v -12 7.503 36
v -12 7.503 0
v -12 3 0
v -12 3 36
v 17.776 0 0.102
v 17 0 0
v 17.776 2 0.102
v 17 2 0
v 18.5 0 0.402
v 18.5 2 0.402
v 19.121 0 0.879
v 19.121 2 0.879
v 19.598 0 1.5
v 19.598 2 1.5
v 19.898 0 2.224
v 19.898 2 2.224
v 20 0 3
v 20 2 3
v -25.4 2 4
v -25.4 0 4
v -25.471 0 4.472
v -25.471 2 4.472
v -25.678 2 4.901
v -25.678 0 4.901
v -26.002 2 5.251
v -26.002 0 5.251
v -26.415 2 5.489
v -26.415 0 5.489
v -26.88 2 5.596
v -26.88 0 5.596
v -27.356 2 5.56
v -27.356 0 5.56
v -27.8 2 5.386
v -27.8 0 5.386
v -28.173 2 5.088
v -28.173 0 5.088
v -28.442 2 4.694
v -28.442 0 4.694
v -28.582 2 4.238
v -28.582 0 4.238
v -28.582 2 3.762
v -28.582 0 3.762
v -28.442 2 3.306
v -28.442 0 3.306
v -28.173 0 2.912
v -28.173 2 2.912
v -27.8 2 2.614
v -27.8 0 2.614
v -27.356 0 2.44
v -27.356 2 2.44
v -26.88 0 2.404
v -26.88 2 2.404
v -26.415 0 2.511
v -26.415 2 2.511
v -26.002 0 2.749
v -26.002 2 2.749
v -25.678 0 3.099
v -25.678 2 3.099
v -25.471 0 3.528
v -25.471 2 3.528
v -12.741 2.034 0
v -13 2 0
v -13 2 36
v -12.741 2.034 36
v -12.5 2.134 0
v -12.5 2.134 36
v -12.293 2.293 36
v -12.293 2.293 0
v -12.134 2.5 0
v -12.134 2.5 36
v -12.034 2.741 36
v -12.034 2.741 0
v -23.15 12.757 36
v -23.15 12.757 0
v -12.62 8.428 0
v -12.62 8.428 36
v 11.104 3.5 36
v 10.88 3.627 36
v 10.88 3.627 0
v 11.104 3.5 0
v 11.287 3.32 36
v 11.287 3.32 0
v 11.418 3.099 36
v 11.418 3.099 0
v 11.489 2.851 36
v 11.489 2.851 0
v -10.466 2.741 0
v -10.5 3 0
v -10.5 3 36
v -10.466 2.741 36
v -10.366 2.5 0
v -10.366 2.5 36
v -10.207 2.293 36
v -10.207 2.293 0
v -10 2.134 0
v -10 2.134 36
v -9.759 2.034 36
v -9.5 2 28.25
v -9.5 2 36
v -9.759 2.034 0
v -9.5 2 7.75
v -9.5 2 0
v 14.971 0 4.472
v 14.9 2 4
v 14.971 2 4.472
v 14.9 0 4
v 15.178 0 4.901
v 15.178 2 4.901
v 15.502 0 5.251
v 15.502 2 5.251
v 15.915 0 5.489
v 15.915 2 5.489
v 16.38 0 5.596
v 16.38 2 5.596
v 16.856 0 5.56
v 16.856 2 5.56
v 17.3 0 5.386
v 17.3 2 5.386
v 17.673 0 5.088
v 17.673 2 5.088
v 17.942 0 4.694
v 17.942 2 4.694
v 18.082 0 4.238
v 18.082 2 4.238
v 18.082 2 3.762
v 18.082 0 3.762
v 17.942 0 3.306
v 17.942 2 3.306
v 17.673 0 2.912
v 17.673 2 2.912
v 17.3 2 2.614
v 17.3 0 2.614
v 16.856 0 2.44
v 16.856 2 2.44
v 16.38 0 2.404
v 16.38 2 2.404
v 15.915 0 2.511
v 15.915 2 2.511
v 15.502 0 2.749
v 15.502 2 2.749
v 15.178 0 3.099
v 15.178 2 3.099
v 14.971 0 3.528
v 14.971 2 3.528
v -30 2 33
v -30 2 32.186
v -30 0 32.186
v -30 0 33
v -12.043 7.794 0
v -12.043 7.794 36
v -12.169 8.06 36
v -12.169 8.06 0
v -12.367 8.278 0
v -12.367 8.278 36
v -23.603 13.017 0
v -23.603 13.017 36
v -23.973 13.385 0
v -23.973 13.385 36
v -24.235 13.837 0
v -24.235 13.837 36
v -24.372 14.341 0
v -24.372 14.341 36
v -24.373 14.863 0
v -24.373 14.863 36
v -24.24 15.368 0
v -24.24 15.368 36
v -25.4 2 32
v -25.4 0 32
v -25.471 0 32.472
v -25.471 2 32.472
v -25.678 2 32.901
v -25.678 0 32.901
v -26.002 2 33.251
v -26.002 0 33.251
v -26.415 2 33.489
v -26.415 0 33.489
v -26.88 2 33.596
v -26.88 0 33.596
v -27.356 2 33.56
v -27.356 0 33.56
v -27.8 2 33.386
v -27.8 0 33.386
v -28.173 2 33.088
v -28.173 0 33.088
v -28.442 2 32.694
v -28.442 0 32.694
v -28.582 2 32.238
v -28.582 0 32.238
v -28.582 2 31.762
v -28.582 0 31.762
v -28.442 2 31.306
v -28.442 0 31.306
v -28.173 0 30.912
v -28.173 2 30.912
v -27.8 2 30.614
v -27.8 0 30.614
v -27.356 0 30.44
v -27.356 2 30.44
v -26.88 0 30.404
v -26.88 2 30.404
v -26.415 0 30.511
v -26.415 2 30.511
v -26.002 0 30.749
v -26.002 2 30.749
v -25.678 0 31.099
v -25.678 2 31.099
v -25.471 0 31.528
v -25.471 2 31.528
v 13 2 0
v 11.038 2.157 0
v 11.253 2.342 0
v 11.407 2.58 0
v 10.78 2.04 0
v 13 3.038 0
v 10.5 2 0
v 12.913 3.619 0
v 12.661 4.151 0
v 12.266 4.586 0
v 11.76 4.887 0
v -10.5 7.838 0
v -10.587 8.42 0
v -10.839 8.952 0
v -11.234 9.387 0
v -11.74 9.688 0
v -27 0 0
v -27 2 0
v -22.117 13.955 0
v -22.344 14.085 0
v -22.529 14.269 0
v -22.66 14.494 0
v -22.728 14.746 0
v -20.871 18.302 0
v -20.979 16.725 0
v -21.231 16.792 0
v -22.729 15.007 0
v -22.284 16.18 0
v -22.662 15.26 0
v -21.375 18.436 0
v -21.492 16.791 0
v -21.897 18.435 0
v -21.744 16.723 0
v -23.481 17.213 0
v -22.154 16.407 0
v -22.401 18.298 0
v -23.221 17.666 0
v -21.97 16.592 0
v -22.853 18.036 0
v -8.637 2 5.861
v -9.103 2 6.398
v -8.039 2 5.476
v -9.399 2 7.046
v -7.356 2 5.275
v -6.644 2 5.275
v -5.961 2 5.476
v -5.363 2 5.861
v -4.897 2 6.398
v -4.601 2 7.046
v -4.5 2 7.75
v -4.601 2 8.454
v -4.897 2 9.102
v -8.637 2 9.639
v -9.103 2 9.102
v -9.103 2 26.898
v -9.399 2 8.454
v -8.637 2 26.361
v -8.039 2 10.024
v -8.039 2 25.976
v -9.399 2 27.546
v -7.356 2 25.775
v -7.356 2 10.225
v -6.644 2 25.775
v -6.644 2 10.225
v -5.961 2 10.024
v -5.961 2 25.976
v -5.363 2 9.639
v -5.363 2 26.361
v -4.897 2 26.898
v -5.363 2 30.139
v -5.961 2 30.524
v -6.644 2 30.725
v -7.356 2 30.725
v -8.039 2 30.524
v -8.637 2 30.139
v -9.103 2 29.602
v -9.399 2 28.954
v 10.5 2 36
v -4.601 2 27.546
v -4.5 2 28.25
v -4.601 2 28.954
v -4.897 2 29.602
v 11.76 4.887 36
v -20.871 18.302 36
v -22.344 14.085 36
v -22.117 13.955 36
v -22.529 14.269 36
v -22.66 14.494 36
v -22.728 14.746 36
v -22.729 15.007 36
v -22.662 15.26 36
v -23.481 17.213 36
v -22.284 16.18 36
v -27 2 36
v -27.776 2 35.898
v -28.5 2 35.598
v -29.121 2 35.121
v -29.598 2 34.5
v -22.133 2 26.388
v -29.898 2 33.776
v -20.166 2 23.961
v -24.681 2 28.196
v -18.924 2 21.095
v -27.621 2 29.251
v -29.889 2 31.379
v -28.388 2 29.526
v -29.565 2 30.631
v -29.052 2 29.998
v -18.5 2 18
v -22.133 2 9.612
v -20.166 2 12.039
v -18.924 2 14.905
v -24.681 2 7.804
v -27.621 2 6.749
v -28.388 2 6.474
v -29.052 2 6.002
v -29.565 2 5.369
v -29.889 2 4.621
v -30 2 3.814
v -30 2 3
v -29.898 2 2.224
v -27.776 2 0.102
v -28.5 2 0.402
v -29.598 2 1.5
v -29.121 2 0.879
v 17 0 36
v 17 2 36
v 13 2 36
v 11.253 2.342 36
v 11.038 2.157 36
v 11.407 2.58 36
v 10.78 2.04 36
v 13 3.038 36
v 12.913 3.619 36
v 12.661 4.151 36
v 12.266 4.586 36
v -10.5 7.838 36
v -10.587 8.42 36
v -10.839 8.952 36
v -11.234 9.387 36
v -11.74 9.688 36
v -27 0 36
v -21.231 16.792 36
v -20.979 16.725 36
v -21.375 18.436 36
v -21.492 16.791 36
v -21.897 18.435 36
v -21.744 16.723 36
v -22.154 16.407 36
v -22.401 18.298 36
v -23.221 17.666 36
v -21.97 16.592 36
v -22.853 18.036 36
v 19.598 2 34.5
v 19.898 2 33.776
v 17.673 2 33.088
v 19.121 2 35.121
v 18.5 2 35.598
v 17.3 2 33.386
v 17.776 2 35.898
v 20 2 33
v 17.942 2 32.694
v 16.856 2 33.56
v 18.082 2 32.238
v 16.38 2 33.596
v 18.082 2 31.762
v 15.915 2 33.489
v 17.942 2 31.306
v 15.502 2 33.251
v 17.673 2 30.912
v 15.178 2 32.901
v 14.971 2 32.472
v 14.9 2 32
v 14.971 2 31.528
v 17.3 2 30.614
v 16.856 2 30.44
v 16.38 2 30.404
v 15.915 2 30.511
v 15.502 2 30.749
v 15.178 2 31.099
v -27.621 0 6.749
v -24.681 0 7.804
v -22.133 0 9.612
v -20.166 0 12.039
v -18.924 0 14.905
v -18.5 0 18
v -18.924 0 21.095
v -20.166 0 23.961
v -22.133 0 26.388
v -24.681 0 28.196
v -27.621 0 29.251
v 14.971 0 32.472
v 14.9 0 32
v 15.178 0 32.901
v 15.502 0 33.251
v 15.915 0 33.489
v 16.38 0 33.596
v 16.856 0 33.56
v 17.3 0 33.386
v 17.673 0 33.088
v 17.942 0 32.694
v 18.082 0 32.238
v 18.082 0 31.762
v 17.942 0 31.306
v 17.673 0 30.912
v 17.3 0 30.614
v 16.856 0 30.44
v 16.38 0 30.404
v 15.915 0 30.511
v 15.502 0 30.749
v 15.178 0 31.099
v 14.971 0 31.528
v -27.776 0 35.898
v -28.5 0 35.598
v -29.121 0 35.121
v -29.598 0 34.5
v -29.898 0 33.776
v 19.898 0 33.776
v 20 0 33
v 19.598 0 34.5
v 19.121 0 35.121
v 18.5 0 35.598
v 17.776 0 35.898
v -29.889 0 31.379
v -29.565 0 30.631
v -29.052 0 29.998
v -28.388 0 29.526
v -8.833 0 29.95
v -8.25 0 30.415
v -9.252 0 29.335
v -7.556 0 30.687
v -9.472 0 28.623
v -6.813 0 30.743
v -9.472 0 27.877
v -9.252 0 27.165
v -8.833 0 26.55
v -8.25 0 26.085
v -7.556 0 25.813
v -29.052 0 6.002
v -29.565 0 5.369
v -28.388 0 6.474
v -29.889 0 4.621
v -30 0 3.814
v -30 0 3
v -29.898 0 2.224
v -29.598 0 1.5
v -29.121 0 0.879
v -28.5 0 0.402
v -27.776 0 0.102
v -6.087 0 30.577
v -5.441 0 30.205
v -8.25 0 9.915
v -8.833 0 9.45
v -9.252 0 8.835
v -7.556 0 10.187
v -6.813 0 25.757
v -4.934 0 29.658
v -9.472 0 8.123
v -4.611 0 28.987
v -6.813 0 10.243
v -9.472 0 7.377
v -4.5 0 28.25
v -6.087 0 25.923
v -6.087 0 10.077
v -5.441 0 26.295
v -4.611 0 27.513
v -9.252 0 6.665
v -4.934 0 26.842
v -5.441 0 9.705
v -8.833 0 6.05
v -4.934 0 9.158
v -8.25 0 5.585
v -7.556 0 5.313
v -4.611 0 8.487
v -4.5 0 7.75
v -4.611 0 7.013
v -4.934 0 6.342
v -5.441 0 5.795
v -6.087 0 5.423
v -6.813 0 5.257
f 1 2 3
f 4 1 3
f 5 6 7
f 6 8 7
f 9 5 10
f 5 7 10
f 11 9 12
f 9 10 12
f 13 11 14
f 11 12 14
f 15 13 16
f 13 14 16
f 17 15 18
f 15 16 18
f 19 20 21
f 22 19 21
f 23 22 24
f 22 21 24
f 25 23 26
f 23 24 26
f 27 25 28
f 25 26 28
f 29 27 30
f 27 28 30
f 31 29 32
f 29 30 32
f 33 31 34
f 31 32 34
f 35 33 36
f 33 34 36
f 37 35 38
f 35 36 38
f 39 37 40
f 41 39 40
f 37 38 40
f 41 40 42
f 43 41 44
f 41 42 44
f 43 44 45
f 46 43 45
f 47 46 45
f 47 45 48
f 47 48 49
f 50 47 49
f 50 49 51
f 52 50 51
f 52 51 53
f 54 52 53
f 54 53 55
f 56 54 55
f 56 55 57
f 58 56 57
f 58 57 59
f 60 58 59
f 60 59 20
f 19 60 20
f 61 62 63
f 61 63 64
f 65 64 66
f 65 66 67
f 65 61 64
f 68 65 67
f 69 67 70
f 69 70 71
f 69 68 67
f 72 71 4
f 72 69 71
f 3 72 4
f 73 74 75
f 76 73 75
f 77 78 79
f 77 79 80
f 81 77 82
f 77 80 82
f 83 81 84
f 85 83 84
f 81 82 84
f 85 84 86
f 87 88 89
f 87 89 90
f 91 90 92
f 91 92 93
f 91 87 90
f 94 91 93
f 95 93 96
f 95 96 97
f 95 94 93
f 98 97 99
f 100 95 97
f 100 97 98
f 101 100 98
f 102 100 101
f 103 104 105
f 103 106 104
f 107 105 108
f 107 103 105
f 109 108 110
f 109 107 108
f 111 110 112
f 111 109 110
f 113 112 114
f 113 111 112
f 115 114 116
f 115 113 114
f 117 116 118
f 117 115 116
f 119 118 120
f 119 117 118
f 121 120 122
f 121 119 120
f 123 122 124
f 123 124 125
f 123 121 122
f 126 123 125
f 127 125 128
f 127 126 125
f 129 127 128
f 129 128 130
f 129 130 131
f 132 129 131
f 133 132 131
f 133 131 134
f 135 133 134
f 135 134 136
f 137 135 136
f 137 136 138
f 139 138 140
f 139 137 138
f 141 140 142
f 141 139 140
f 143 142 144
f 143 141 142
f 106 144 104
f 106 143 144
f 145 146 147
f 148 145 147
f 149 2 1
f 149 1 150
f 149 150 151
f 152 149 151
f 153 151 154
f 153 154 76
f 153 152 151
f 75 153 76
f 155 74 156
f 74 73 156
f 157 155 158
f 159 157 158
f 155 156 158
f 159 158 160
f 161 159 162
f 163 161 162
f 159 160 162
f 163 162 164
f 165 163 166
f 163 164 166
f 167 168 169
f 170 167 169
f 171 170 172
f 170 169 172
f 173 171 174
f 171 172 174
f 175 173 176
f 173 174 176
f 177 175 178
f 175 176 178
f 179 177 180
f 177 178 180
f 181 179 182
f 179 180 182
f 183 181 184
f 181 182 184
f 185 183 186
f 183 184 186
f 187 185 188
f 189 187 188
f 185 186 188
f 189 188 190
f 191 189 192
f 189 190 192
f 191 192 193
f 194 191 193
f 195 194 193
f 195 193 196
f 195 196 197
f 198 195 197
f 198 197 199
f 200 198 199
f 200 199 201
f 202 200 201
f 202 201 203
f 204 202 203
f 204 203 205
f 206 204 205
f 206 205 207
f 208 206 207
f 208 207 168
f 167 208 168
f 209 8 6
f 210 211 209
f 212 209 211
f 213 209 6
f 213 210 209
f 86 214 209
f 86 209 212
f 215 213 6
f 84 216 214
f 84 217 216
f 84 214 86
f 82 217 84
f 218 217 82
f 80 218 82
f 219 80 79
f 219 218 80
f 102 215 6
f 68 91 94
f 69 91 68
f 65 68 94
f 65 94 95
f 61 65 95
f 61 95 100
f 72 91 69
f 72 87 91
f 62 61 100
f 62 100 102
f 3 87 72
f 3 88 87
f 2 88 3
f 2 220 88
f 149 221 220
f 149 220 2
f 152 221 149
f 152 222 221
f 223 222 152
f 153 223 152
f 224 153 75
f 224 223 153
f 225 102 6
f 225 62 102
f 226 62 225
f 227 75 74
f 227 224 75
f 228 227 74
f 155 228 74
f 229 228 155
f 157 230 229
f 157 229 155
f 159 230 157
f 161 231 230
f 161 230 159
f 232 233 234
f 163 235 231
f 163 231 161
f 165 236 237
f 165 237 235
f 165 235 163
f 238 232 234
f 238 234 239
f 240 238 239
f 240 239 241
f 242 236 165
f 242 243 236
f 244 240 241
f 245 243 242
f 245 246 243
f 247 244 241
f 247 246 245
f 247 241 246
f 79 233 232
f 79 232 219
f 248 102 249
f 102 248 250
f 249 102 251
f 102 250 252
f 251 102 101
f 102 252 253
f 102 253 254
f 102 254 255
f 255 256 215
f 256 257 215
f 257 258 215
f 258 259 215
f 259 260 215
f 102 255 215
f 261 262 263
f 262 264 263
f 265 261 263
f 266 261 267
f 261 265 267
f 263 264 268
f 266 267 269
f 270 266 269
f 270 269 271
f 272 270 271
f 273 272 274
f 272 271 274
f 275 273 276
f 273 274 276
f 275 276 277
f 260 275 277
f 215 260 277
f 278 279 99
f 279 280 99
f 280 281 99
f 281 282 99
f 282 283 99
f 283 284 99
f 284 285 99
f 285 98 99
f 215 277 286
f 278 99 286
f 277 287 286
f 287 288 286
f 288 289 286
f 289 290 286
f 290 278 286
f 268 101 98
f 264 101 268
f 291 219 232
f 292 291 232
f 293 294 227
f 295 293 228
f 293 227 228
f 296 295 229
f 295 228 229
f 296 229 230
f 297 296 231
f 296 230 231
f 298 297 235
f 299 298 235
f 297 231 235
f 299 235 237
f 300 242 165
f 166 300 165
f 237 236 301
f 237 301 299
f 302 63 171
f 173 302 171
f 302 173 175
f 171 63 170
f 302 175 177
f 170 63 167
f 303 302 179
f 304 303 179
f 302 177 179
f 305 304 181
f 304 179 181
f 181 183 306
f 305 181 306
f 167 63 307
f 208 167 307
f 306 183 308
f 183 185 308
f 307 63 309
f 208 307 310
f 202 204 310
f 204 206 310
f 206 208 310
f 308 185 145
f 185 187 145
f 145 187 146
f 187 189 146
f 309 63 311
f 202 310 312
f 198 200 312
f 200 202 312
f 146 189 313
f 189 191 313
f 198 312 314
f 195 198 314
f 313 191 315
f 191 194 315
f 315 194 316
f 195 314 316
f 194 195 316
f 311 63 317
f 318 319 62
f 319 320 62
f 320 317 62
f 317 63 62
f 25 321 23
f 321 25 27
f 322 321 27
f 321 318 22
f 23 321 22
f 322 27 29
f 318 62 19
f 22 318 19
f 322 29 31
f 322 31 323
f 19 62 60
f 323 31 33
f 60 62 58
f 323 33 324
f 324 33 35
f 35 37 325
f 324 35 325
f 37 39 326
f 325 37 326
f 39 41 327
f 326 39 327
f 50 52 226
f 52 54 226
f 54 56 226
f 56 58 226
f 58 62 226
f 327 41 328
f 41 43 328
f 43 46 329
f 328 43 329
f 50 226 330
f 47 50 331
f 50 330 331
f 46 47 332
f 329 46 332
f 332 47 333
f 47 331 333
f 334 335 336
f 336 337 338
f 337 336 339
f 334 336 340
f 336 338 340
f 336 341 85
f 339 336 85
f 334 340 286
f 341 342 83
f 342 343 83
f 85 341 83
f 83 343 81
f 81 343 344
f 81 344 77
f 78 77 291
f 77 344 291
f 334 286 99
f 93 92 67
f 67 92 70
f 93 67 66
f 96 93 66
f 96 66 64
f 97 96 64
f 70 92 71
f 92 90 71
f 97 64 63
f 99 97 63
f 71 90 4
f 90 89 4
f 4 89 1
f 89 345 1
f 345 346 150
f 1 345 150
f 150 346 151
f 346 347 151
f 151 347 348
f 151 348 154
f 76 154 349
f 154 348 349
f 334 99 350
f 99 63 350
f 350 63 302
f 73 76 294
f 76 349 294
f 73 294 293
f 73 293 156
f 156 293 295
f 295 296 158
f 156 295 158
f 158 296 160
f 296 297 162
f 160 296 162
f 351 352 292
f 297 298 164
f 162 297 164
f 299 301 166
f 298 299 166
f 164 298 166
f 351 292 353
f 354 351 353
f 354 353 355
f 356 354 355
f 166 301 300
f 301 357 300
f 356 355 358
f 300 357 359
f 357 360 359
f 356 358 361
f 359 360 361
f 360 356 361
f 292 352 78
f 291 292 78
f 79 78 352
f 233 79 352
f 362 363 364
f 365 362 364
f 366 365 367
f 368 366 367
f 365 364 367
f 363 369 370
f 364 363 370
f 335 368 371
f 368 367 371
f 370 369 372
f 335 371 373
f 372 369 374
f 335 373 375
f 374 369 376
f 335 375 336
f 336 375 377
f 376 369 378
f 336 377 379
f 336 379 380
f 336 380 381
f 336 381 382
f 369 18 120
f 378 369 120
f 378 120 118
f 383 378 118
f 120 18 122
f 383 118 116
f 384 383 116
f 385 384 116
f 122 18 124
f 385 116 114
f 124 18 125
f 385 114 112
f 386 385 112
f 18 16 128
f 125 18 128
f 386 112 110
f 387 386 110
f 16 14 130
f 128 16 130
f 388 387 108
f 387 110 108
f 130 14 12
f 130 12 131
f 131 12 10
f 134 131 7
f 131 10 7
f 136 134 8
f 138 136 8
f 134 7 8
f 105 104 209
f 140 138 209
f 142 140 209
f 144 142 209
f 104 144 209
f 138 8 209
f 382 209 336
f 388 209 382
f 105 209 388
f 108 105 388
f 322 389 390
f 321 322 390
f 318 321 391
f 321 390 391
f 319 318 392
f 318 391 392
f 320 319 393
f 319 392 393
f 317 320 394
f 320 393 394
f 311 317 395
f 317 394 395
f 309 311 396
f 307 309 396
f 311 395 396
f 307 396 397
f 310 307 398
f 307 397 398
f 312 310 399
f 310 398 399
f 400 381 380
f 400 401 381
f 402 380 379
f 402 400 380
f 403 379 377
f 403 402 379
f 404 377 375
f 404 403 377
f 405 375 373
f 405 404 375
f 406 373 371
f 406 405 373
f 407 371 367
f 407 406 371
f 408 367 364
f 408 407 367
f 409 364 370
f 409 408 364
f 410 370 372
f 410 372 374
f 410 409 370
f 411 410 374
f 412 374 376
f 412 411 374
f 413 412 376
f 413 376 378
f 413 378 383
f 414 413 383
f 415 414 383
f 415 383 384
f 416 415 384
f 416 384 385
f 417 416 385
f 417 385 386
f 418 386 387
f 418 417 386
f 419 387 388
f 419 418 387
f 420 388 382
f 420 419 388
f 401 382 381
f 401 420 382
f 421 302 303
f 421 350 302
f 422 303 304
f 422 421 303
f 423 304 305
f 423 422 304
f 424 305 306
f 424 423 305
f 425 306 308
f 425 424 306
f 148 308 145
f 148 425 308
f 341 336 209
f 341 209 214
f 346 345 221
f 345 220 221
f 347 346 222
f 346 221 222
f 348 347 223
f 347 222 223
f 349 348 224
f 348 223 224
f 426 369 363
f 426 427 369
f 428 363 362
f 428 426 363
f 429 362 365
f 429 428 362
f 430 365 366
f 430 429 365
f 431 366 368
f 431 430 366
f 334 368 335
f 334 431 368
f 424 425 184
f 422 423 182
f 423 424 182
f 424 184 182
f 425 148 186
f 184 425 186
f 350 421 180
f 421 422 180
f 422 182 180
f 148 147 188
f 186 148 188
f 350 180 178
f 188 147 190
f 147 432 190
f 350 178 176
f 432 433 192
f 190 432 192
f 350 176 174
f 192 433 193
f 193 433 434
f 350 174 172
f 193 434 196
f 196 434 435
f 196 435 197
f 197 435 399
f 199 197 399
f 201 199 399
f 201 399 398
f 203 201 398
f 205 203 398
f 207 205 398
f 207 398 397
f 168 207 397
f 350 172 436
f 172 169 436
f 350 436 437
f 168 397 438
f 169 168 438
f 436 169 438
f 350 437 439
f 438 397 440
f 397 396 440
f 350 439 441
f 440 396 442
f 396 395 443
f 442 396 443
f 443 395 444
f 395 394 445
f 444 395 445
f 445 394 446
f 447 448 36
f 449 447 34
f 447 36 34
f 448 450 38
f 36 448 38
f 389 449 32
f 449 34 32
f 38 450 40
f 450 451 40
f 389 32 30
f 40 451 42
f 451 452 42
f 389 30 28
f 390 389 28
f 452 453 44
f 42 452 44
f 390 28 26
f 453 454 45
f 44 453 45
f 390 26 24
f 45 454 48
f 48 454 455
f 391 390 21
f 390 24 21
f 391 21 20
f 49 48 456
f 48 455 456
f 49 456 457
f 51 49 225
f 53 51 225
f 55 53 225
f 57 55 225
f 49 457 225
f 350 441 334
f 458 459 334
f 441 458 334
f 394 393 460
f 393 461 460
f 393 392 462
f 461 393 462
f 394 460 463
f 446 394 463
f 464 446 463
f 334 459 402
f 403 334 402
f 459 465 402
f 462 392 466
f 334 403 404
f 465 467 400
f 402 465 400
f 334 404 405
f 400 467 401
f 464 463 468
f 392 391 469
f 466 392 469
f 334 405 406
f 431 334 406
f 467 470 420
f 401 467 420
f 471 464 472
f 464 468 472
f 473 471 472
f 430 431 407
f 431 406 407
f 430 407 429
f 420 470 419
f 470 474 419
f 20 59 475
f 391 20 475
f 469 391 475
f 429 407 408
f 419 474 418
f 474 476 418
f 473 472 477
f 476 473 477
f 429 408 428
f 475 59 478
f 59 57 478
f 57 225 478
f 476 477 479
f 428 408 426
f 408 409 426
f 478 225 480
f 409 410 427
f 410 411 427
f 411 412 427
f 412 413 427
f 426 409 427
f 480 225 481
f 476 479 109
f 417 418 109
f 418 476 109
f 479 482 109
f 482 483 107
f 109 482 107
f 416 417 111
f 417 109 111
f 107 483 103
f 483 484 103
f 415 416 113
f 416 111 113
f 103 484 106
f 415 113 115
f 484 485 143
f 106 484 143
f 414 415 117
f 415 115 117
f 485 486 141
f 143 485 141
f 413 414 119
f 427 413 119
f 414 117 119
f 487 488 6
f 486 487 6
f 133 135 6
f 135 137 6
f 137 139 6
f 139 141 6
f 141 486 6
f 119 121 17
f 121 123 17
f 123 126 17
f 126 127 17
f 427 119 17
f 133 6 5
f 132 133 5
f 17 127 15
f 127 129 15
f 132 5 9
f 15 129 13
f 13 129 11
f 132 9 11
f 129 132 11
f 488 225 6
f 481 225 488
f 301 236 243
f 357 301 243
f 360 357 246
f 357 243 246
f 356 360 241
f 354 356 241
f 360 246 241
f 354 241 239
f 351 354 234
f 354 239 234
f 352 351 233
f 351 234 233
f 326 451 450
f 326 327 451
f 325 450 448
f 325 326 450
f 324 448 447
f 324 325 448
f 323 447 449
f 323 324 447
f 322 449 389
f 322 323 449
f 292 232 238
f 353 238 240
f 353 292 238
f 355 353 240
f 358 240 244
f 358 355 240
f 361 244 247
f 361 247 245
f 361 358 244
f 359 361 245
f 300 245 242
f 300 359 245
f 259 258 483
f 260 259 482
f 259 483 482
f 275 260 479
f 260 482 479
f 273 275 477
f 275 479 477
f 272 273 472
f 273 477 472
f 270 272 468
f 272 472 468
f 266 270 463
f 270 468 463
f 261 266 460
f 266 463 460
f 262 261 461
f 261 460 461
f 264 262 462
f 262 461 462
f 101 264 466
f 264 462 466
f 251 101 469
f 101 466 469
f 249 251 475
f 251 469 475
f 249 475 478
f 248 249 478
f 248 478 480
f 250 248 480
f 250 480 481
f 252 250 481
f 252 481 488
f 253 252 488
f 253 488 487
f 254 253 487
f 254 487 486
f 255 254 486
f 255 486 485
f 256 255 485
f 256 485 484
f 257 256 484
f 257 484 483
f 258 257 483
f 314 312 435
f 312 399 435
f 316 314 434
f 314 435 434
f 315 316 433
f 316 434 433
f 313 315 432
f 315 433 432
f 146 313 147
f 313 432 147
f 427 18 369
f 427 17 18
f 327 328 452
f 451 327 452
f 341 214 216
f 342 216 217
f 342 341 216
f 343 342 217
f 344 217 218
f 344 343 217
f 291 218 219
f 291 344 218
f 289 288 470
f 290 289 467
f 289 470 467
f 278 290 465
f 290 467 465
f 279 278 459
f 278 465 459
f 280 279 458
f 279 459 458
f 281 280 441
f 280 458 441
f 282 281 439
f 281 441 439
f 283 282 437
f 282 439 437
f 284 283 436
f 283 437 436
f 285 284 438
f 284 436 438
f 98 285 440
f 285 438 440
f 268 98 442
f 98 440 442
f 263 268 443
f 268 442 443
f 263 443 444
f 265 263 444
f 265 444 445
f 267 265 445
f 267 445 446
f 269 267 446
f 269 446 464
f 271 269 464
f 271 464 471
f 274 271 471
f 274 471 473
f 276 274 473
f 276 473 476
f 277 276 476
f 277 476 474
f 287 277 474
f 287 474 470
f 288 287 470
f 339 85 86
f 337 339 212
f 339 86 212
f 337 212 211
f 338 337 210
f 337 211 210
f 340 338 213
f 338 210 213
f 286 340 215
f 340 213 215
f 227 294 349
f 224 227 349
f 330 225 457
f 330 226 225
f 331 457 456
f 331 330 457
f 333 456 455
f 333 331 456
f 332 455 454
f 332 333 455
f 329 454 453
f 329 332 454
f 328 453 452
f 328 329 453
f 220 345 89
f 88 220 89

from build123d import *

# Parameters (mm, degrees)
F1_DEPTH     = 36
F2_T         = -1.5
F3_R         = 1.6
F4_DEPTH     = 1.5
F5_R         = 1.6
F6_DEPTH     = 5
F7_DEPTH     = 0.5
F8_DEPTH     = 0.5
F9_R         = 3
F10_T1_DEPTH = 36
F11_R        = 2
F5_R_2       = 2.5
F12_DEPTH    = 5


# Not quite as in the source:
# - a fillet or chamfer that OpenCascade refuses, or shapes differently, is made with other operations: its cross-section is extruded or revolved along the edge and cut away or added


with BuildPart() as f1:
    # F0 (on Top) → F1 (new body)
    with BuildSketch(Plane.XY):
        Polygon((-12, 0), (20, 0), (20, 1.5), (13, 1.5), (13, 4.3777777778), (-22.720401141, 19.0628315802), (-25, 13.5178613825), (-12, 8.1734169381), (-12, 1.5), (-30, 1.5), (-30, 0), align=None)
    extrude(amount=F1_DEPTH)

    # F2: a shell. OpenCascade refuses it in one call, so the cavity is built on its own and cut out:
    # the body offset inwards by the wall thickness, plus a prism from it out through each open face.
    f2_core = offset(f1.part, amount=F2_T, kind=Kind.INTERSECTION, mode=Mode.PRIVATE)
    f2_exits = [f2_core.faces().sort_by_distance(p)[0] for p in [
        (-5.203768, 6.959906, 34.5),
        (-5.203768, 6.959906, 1.5),
    ]]
    add(f2_core, mode=Mode.SUBTRACT)
    extrude(f2_exits, amount=-F2_T, mode=Mode.SUBTRACT)

    # F3 (on face) → F4 (cut)
    with BuildSketch(Plane(origin=(0, 1.5, 0), x_dir=(-1, 0, 0), z_dir=(0, 1, 0))):
        with Locations((-16.5, 32)):
            Circle(F3_R)
        with Locations((-16.5, 4)):
            Circle(F3_R)
    extrude(amount=-F4_DEPTH, mode=Mode.SUBTRACT)

    # F5 (on face) → F6 (cut)
    with BuildSketch(Plane.XZ):
        with Locations((-27, 32)):
            Circle(F5_R)
        with BuildLine():
            Line((-30, 29.5), (-30, 6.5))
            ThreePointArc((-30, 6.5), (-18.5, 18), (-30, 29.5))
        make_face()
        with Locations((-27, 4)):
            Circle(F5_R)
    extrude(amount=-F6_DEPTH, mode=Mode.SUBTRACT)

    # F7 (add): faces of the model
    f7_faces = [f1.faces().sort_by_distance(p)[0] for p in [
        (16.5, 1.5, 18),
        (-21, 1.5, 0.4024922359),
    ]]
    extrude(f7_faces, amount=F7_DEPTH)

    # F8 (add): a face of the model
    f8_faces = [f1.faces().sort_by_distance(p)[0] for p in [
        (0.5, 1.5, 18),
    ]]
    extrude(f8_faces, amount=F8_DEPTH)

    # F9
    f9_edges = [f1.edges().sort_by_distance(p)[0] for p in [
        (20, 1, 36),
        (20, 1, 0),
        (-30, 1, 0),
        (-30, 1, 36),
        (-30, 1, 6.5),
        (-30, 1, 29.5),
    ]]
    fillet(f9_edges, radius=F9_R)

    # F10: fillet of radius 1 on 8 edges, made by hand

    # F10_s2 → F10_t1 (join)
    with BuildSketch(Plane.XY):
        with BuildLine():
            ThreePointArc((-10.5, 3), (-10.2071067812, 2.2928932188), (-9.5, 2))
            Line((-9.5, 2), (-10.5, 2))
            Line((-10.5, 2), (-10.5, 3))
        make_face()
        with BuildLine():
            ThreePointArc((-22.1174237286, 13.954615363), (-22.6600526413, 14.4943748472), (-22.6620816337, 15.2597390224))
            Line((-22.6620816337, 15.2597390224), (-23.0423145109, 14.3348482402))
            Line((-23.0423145109, 14.3348482402), (-22.1174237286, 13.954615363))
        make_face()
        with BuildLine():
            ThreePointArc((-22.2836471604, 16.1802553088), (-21.7438876763, 16.7228842215), (-20.978523501, 16.7249132139))
            Line((-20.978523501, 16.7249132139), (-21.9034142833, 17.105146091))
            Line((-21.9034142833, 17.105146091), (-22.2836471604, 16.1802553088))
        make_face()
        with BuildLine():
            ThreePointArc((10.8802328772, 3.6274244806), (11.3307324711, 3.2592055599), (11.5, 2.7025336984))
            Line((11.5, 2.7025336984), (11.5, 3.3726313301))
            Line((11.5, 3.3726313301), (10.8802328772, 3.6274244806))
        make_face()
        with BuildLine():
            ThreePointArc((-13, 2), (-12.2928932188, 2.2928932188), (-12, 3))
            Line((-12, 3), (-12, 2))
            Line((-12, 2), (-13, 2))
        make_face()
        with BuildLine():
            ThreePointArc((-12, 7.5033193063), (-12.1692675289, 8.0599911678), (-12.6197671228, 8.4282100886))
            Line((-12.6197671228, 8.4282100886), (-12, 8.1734169381))
            Line((-12, 8.1734169381), (-12, 7.5033193063))
        make_face()
        with BuildLine():
            ThreePointArc((11.5, 3), (11.2071067812, 2.2928932188), (10.5, 2))
            Line((10.5, 2), (11.5, 2))
            Line((11.5, 2), (11.5, 3))
        make_face()
    extrude(amount=F10_T1_DEPTH)

    # F11
    f11_edges = [f1.edges().sort_by_distance(p)[0] for p in [
        (-25, 13.517861, 18),
        (-22.720401, 19.062832, 18),
        (13, 4.377778, 18),
        (-10.5, 9.178563, 18),
    ]]
    fillet(f11_edges, radius=F11_R)

    # F5 (on face) → F12 (cut)
    with BuildSketch(Plane.XZ):
        with Locations((-7, 28.25)):
            Circle(F5_R_2)
        with Locations((-7, 7.75)):
            Circle(F5_R_2)
    extrude(amount=-F12_DEPTH, mode=Mode.SUBTRACT)


solid = f1.part
